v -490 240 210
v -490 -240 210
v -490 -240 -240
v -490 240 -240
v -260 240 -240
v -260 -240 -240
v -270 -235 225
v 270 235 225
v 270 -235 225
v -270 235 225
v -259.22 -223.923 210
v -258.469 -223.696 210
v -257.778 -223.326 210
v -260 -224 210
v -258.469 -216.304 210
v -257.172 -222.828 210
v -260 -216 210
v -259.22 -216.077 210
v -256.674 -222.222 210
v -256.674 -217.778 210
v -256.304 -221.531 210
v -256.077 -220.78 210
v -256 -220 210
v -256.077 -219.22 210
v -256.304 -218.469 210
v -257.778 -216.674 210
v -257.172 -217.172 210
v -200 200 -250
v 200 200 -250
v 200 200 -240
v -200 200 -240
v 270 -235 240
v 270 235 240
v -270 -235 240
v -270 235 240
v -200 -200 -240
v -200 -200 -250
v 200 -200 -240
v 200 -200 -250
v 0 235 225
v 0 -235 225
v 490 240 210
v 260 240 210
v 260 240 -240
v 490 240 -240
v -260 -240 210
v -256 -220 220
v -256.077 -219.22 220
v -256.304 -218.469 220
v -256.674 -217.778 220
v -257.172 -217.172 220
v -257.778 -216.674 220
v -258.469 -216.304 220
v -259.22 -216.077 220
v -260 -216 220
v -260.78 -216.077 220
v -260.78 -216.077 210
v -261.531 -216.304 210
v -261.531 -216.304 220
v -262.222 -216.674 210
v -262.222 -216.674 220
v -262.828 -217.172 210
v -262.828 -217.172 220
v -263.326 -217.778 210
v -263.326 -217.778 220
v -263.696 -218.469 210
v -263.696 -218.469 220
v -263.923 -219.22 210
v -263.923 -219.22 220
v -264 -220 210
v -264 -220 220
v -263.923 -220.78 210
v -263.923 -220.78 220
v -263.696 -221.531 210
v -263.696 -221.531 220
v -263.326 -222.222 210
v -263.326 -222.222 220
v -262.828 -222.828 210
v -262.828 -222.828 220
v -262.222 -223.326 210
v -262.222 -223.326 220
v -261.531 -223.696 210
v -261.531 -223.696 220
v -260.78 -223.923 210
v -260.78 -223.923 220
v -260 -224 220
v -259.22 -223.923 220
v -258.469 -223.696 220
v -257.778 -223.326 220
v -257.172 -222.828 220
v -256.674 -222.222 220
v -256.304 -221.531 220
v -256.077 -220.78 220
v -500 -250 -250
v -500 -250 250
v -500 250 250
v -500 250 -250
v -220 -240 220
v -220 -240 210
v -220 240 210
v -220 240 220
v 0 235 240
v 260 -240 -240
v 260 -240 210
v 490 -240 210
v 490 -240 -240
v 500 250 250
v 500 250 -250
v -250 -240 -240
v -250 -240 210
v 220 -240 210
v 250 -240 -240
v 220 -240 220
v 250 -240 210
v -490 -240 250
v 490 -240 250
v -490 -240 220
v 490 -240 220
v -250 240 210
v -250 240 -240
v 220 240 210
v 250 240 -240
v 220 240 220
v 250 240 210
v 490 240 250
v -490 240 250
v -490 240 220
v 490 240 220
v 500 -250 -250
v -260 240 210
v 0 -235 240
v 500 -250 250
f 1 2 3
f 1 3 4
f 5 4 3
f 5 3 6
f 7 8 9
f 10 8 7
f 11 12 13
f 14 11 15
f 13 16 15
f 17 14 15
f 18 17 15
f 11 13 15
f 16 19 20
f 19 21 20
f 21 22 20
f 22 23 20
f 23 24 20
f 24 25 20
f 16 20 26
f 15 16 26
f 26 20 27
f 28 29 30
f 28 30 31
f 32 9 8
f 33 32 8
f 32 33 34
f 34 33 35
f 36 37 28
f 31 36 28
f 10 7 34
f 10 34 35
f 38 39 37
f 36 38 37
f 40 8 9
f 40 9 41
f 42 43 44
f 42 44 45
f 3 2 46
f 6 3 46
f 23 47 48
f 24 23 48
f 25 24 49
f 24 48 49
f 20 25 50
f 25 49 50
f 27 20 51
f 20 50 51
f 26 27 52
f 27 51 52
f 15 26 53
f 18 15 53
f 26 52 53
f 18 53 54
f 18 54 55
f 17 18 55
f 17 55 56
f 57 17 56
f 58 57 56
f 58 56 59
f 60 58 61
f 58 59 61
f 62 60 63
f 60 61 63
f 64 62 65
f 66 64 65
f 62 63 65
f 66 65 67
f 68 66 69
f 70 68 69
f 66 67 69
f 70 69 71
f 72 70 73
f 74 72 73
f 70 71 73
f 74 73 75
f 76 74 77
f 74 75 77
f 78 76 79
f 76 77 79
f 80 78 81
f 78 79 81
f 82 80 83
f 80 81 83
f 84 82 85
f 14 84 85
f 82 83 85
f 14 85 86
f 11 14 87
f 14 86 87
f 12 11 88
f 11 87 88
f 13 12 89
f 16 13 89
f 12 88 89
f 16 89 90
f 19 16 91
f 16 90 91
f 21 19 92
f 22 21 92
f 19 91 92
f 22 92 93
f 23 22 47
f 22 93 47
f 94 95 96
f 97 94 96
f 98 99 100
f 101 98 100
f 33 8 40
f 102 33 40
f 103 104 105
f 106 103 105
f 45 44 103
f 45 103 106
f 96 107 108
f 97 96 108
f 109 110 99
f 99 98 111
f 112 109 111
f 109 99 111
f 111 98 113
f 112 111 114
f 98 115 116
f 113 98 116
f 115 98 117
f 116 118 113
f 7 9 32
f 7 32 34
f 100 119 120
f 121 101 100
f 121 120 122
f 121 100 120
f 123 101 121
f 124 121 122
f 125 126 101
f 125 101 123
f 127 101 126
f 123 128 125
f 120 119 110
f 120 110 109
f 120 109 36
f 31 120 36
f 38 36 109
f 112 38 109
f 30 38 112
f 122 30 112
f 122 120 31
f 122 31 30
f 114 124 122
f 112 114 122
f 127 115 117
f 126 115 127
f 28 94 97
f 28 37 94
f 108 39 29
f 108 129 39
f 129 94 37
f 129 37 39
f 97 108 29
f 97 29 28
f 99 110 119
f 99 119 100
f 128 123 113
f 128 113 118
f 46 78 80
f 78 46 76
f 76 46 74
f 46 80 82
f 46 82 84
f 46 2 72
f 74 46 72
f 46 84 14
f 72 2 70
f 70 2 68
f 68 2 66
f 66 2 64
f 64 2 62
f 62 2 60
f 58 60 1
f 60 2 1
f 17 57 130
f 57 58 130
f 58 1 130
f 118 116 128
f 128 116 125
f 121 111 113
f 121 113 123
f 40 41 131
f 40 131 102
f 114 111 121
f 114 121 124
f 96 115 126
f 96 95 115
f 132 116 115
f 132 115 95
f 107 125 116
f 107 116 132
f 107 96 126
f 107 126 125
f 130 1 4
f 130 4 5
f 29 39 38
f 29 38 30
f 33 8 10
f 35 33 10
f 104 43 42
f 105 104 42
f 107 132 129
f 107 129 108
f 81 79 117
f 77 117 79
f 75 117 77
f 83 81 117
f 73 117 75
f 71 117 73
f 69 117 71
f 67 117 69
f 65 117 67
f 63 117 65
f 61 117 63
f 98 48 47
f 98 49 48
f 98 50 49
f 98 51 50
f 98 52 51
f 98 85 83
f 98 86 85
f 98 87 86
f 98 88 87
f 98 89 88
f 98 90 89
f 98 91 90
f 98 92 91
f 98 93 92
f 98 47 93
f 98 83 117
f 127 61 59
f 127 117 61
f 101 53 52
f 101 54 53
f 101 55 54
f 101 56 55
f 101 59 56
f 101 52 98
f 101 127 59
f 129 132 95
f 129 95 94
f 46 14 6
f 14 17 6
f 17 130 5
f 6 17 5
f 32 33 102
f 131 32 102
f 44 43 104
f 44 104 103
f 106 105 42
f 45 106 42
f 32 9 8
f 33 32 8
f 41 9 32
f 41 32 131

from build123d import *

# Parameters (mm, degrees)
ESBO_O1_W                = 1000
ESBO_O1_H                = 500
RESSALTO_EXTRUS_O1_DEPTH = 250
CASCA1_T                 = -10
ESBO_O3_W                = 400
ESBO_O3_H                = 400
CORTE_EXTRUS_O5_DEPTH    = 250
ESBO_O21_W               = 270
ESBO_O21_H               = 480
RESSALTO_EXTRUS_O3_DEPTH = 10
PADR_O_LINEAR1_COUNT     = 2
PADR_O_LINEAR1_PITCH     = 710
ESBO_O24_R               = 4
CORTE_EXTRUS_O7_DEPTH    = 25
ESBO_O34_W               = 460
ESBO_O34_H               = 500
RESSALTO_EXTRUS_O6_DEPTH = 10
ESBO_O35_W               = 450
ESBO_O35_H               = 480
RESSALTO_EXTRUS_O7_DEPTH = 10
ESBO_O36_W               = 270
ESBO_O36_H               = 470
RESSALTO_EXTRUS_O8_DEPTH = 15


with BuildPart() as part:
    # Esboço1 → Ressalto-extrusão1 (new, symmetric)
    with BuildSketch(Plane.XY):
        Rectangle(ESBO_O1_W, ESBO_O1_H)
    extrude(amount=RESSALTO_EXTRUS_O1_DEPTH, both=True)

    # Casca1
    casca1_openings = [part.faces().sort_by_distance(p)[0] for p in [
        (0, 0, 250),
    ]]
    offset(amount=CASCA1_T, openings=casca1_openings, kind=Kind.INTERSECTION)

    # Esboço3 → Corte-extrusão5 (cut, symmetric)
    with BuildSketch(Plane(origin=(0, 0, -250), x_dir=(-1, 0, 0), z_dir=(0, 0, -1))):
        Rectangle(ESBO_O3_W, ESBO_O3_H)
    extrude(amount=CORTE_EXTRUS_O5_DEPTH, both=True, mode=Mode.SUBTRACT)

    # Esboço21 → Ressalto-extrusão3 (add)
    with BuildSketch(Plane.XY.offset(210)):
        with Locations((-355, 0)):
            Rectangle(ESBO_O21_W, ESBO_O21_H)
    ressalto_extrus_o3 = extrude(amount=RESSALTO_EXTRUS_O3_DEPTH)

    # Padrão linear1: Ressalto-extrusão3 ×2
    with Locations(*[(i * PADR_O_LINEAR1_PITCH, 0, 0) for i in range(1, PADR_O_LINEAR1_COUNT)]):
        add(ressalto_extrus_o3)

    # Esboço24 → Corte-extrusão7 (cut, symmetric)
    with BuildSketch(Plane.XY.offset(220)):
        with Locations((-260, -220)):
            Circle(ESBO_O24_R)
    extrude(amount=CORTE_EXTRUS_O7_DEPTH, both=True, mode=Mode.SUBTRACT)

    # Esboço34 → Ressalto-extrusão6 (add)
    with BuildSketch(Plane(origin=(-250, 0, 0), x_dir=(0, 0, -1), z_dir=(1, 0, 0))):
        with Locations((20, 0)):
            Rectangle(ESBO_O34_W, ESBO_O34_H)
    extrude(amount=-RESSALTO_EXTRUS_O6_DEPTH)

    # Esboço35 → Ressalto-extrusão7 (add)
    with BuildSketch(Plane(origin=(250, 0, 0), x_dir=(0, 0, -1), z_dir=(1, 0, 0))):
        with Locations((15, 0)):
            Rectangle(ESBO_O35_W, ESBO_O35_H)
    extrude(amount=RESSALTO_EXTRUS_O7_DEPTH)


with BuildPart() as body_2:
    # Esboço36 → Ressalto-extrusão8 (new body)
    with BuildSketch(Plane.XY.offset(225)):
        with Locations((-135, 0)):
            Rectangle(ESBO_O36_W, ESBO_O36_H)
    ressalto_extrus_o8 = extrude(amount=RESSALTO_EXTRUS_O8_DEPTH)


with BuildPart() as body_3:
    # Espelhar5: mirrored copy
    add(body_2.part.mirror(Plane(origin=(0, -235, 240), x_dir=(0, 0, 1), z_dir=(-1, 0, 0))))


with BuildPart() as body_2_1:
    add(body_2.part)

    # Espelhar4: Ressalto-extrusão8 across plane
    add(ressalto_extrus_o8.mirror(Plane(origin=(0, -235, 240), x_dir=(0, 0, 1), z_dir=(-1, 0, 0))))


solid = Compound([part.part, body_3.part, body_2_1.part])
